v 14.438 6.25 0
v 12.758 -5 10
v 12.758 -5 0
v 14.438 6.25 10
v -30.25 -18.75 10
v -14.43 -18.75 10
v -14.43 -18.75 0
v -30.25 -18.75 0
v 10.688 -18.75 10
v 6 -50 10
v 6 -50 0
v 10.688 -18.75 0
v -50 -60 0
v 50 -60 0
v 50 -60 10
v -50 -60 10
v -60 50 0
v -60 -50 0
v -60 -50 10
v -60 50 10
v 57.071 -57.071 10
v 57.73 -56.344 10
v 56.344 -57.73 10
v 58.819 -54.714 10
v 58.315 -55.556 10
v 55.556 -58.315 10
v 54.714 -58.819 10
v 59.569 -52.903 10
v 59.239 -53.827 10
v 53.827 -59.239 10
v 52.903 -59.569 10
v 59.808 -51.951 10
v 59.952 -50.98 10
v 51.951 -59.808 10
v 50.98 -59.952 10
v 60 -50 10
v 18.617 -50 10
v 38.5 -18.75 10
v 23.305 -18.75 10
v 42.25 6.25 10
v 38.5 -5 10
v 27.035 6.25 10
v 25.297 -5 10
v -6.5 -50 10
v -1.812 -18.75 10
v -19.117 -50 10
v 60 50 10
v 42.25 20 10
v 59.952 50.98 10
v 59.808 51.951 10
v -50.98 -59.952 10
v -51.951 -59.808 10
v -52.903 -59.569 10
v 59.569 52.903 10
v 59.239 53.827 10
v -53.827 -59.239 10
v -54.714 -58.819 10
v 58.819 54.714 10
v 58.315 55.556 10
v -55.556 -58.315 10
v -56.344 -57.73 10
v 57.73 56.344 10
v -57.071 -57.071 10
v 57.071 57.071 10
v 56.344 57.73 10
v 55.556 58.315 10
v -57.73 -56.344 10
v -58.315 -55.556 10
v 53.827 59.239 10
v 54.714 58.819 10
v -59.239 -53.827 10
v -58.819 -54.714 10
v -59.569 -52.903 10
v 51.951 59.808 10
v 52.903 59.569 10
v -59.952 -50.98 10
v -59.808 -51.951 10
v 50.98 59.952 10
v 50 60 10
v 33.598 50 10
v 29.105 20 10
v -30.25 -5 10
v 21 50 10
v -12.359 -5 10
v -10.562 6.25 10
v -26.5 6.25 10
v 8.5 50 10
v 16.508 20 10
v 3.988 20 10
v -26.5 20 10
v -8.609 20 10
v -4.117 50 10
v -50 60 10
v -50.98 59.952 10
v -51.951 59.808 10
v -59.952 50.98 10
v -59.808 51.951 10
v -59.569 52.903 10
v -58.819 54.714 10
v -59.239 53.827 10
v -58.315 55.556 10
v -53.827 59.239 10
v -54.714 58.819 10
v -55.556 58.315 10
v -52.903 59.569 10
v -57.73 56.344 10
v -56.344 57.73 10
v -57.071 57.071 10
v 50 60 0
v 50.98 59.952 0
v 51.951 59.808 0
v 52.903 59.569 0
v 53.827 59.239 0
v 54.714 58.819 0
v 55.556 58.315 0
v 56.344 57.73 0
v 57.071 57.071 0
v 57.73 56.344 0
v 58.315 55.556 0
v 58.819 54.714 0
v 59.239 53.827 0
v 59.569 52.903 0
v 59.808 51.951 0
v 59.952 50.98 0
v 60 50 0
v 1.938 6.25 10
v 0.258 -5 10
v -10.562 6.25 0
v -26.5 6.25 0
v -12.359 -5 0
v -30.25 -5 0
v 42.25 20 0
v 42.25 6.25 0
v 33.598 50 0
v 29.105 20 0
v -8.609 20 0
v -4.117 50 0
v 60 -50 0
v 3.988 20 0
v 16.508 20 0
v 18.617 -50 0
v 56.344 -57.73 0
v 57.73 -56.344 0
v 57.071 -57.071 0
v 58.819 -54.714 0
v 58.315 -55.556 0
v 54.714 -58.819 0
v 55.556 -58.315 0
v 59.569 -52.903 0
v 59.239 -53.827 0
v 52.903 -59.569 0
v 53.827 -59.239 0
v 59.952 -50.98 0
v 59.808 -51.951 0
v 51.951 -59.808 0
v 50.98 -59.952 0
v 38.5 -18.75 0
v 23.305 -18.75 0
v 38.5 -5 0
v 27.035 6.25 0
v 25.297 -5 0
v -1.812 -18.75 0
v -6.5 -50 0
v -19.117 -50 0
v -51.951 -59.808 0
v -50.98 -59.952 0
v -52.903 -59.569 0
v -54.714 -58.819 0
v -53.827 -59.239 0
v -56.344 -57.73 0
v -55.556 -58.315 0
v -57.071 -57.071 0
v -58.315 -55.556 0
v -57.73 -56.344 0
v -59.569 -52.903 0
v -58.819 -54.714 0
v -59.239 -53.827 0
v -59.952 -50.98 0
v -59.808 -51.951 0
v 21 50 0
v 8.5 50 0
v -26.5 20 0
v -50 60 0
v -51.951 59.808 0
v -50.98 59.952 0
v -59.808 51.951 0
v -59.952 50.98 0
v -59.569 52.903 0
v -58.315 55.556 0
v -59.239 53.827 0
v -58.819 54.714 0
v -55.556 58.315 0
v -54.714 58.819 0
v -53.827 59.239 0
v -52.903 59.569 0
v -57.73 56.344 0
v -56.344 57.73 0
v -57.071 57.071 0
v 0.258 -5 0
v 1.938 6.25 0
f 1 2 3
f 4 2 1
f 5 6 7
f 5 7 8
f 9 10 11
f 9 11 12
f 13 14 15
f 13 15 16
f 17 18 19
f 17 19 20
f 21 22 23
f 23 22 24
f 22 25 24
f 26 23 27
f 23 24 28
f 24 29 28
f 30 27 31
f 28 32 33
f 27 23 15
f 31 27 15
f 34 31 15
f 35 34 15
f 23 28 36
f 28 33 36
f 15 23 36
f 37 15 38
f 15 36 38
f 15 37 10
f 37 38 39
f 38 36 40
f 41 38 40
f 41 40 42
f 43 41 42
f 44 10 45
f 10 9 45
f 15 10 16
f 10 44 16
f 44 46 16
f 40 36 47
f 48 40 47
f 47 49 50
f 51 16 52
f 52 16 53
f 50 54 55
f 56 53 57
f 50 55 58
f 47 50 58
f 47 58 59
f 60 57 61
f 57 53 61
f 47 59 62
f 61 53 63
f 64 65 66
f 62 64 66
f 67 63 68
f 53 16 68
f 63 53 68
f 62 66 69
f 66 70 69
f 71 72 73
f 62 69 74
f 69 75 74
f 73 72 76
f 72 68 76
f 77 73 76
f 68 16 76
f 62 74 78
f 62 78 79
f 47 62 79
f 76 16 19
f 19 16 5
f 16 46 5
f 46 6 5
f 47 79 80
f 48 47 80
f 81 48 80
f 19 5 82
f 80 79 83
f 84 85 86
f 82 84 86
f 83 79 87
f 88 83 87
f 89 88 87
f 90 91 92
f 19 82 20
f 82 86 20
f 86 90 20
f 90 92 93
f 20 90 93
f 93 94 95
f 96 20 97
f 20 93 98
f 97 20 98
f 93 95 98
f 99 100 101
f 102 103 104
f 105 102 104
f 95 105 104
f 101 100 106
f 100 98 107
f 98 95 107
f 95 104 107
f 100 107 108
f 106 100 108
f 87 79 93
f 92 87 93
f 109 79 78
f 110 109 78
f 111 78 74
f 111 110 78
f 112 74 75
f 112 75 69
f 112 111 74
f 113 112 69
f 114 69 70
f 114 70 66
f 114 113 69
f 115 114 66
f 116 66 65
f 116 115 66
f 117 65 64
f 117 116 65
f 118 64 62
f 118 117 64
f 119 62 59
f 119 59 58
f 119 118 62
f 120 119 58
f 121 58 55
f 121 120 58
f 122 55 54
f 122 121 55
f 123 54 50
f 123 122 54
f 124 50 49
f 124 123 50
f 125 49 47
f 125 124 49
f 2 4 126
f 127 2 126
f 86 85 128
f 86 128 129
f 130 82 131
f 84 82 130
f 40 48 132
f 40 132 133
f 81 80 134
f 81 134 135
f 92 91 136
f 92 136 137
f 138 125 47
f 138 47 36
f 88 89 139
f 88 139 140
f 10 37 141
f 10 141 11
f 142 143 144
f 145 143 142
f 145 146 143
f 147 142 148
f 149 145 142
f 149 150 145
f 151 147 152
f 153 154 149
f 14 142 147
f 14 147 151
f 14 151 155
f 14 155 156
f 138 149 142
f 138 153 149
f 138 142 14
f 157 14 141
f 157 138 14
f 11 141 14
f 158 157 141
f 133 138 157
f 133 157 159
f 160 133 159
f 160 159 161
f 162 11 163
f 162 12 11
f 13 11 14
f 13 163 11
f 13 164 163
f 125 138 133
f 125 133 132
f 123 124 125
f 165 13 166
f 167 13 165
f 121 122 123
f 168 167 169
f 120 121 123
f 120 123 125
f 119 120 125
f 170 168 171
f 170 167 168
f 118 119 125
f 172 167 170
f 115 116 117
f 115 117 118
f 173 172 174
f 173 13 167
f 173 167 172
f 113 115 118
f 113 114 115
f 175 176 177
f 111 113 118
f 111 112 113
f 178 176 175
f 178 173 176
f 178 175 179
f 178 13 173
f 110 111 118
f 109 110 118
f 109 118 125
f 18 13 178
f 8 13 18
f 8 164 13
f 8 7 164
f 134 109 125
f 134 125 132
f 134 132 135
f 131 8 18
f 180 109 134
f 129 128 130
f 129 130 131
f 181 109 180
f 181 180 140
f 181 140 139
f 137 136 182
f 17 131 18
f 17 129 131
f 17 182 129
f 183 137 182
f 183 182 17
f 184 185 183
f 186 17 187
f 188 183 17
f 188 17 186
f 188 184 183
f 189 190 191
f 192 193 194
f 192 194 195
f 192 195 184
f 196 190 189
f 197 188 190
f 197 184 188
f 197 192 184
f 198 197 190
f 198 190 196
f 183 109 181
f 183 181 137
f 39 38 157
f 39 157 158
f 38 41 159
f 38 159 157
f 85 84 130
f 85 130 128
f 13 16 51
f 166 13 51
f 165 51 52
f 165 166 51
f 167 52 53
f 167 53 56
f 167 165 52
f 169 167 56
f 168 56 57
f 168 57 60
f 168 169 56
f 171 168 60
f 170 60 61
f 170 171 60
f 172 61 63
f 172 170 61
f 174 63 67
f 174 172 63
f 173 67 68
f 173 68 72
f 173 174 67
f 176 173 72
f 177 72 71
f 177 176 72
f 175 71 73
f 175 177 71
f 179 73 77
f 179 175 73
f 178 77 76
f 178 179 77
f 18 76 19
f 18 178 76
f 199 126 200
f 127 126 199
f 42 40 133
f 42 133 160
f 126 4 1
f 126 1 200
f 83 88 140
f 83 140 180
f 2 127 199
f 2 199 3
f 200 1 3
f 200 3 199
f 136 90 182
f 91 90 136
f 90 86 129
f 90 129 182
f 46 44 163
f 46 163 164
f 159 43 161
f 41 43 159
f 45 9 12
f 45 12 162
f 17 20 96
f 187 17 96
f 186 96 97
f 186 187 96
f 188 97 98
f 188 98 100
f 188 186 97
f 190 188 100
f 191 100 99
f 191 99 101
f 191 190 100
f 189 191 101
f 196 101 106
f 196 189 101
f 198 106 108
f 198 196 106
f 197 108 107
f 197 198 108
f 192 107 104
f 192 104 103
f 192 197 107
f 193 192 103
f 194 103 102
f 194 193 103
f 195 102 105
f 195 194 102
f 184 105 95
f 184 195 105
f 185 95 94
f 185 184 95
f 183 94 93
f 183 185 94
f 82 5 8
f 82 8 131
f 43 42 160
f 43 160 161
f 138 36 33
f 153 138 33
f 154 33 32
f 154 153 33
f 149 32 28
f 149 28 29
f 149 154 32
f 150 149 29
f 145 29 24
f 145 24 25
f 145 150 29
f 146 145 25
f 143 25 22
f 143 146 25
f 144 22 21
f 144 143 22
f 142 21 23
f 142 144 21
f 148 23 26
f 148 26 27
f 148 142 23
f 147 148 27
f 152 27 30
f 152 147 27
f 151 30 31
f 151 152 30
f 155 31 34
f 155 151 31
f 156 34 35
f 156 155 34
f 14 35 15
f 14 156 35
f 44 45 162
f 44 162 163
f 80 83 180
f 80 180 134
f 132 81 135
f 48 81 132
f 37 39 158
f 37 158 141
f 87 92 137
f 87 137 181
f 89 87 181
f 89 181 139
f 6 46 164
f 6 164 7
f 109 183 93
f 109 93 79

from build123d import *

# Parameters (mm, degrees)
BOSS_EXTRUDE1_DEPTH = 10
CUT_EXTRUDE11_DEPTH = 10


with BuildPart() as part:
    # Sketch1 → Boss-Extrude1 (new body)
    with BuildSketch(Plane.XY):
        with BuildLine():
            Line((-50, 60), (50, 60))
            ThreePointArc((50, 60), (57.071067812, 57.071067812), (60, 50))
            Line((60, 50), (60, -50))
            ThreePointArc((60, -50), (57.071067812, -57.071067812), (50, -60))
            Line((50, -60), (-50, -60))
            ThreePointArc((-50, -60), (-57.071067812, -57.071067812), (-60, -50))
            Line((-60, -50), (-60, 50))
            ThreePointArc((-60, 50), (-57.071067812, 57.071067812), (-50, 60))
        make_face()
    extrude(amount=BOSS_EXTRUDE1_DEPTH)

    # Sketch2 → Cut-Extrude11 (cut)
    with BuildSketch(Plane.XY.offset(10)):
        Polygon((38.5, -5), (38.5, -18.75), (23.3046875, -18.75), (18.6171875, -50), (6, -50), (10.6875, -18.75), (-1.8125, -18.75), (-6.5, -50), (-19.1171875, -50), (-14.4296875, -18.75), (-30.25, -18.75), (-30.25, -5), (-12.359375, -5), (-10.5625, 6.25), (-26.5, 6.25), (-26.5, 20), (-8.609375, 20), (-4.1171875, 50), (8.5, 50), (3.98828125, 20), (16.5078125, 20), (21, 50), (33.59765625, 50), (29.10546875, 20), (42.25, 20), (42.25, 6.25), (27.03515625, 6.25), (25.296875, -5), align=None)
        Polygon((14.4375, 6.25), (1.9375, 6.25), (0.2578125, -5), (12.7578125, -5), align=None, mode=Mode.SUBTRACT)
    extrude(amount=-CUT_EXTRUDE11_DEPTH, mode=Mode.SUBTRACT)


with BuildPart() as cut_extrude11_piece_1:
    # of the separate pieces the step leaves, piece 1, a body of its own (cut_extrude11_pieces)
    add(part.part.solids().sort_by_distance((-50, 60, 0))[0])


with BuildPart() as cut_extrude11_piece_2:
    # of the separate pieces the step leaves, piece 2, a body of its own (cut_extrude11_pieces)
    add(part.part.solids().sort_by_distance((14.4375, 6.25, 0))[0])


solid = Compound([cut_extrude11_piece_1.part, cut_extrude11_piece_2.part])
